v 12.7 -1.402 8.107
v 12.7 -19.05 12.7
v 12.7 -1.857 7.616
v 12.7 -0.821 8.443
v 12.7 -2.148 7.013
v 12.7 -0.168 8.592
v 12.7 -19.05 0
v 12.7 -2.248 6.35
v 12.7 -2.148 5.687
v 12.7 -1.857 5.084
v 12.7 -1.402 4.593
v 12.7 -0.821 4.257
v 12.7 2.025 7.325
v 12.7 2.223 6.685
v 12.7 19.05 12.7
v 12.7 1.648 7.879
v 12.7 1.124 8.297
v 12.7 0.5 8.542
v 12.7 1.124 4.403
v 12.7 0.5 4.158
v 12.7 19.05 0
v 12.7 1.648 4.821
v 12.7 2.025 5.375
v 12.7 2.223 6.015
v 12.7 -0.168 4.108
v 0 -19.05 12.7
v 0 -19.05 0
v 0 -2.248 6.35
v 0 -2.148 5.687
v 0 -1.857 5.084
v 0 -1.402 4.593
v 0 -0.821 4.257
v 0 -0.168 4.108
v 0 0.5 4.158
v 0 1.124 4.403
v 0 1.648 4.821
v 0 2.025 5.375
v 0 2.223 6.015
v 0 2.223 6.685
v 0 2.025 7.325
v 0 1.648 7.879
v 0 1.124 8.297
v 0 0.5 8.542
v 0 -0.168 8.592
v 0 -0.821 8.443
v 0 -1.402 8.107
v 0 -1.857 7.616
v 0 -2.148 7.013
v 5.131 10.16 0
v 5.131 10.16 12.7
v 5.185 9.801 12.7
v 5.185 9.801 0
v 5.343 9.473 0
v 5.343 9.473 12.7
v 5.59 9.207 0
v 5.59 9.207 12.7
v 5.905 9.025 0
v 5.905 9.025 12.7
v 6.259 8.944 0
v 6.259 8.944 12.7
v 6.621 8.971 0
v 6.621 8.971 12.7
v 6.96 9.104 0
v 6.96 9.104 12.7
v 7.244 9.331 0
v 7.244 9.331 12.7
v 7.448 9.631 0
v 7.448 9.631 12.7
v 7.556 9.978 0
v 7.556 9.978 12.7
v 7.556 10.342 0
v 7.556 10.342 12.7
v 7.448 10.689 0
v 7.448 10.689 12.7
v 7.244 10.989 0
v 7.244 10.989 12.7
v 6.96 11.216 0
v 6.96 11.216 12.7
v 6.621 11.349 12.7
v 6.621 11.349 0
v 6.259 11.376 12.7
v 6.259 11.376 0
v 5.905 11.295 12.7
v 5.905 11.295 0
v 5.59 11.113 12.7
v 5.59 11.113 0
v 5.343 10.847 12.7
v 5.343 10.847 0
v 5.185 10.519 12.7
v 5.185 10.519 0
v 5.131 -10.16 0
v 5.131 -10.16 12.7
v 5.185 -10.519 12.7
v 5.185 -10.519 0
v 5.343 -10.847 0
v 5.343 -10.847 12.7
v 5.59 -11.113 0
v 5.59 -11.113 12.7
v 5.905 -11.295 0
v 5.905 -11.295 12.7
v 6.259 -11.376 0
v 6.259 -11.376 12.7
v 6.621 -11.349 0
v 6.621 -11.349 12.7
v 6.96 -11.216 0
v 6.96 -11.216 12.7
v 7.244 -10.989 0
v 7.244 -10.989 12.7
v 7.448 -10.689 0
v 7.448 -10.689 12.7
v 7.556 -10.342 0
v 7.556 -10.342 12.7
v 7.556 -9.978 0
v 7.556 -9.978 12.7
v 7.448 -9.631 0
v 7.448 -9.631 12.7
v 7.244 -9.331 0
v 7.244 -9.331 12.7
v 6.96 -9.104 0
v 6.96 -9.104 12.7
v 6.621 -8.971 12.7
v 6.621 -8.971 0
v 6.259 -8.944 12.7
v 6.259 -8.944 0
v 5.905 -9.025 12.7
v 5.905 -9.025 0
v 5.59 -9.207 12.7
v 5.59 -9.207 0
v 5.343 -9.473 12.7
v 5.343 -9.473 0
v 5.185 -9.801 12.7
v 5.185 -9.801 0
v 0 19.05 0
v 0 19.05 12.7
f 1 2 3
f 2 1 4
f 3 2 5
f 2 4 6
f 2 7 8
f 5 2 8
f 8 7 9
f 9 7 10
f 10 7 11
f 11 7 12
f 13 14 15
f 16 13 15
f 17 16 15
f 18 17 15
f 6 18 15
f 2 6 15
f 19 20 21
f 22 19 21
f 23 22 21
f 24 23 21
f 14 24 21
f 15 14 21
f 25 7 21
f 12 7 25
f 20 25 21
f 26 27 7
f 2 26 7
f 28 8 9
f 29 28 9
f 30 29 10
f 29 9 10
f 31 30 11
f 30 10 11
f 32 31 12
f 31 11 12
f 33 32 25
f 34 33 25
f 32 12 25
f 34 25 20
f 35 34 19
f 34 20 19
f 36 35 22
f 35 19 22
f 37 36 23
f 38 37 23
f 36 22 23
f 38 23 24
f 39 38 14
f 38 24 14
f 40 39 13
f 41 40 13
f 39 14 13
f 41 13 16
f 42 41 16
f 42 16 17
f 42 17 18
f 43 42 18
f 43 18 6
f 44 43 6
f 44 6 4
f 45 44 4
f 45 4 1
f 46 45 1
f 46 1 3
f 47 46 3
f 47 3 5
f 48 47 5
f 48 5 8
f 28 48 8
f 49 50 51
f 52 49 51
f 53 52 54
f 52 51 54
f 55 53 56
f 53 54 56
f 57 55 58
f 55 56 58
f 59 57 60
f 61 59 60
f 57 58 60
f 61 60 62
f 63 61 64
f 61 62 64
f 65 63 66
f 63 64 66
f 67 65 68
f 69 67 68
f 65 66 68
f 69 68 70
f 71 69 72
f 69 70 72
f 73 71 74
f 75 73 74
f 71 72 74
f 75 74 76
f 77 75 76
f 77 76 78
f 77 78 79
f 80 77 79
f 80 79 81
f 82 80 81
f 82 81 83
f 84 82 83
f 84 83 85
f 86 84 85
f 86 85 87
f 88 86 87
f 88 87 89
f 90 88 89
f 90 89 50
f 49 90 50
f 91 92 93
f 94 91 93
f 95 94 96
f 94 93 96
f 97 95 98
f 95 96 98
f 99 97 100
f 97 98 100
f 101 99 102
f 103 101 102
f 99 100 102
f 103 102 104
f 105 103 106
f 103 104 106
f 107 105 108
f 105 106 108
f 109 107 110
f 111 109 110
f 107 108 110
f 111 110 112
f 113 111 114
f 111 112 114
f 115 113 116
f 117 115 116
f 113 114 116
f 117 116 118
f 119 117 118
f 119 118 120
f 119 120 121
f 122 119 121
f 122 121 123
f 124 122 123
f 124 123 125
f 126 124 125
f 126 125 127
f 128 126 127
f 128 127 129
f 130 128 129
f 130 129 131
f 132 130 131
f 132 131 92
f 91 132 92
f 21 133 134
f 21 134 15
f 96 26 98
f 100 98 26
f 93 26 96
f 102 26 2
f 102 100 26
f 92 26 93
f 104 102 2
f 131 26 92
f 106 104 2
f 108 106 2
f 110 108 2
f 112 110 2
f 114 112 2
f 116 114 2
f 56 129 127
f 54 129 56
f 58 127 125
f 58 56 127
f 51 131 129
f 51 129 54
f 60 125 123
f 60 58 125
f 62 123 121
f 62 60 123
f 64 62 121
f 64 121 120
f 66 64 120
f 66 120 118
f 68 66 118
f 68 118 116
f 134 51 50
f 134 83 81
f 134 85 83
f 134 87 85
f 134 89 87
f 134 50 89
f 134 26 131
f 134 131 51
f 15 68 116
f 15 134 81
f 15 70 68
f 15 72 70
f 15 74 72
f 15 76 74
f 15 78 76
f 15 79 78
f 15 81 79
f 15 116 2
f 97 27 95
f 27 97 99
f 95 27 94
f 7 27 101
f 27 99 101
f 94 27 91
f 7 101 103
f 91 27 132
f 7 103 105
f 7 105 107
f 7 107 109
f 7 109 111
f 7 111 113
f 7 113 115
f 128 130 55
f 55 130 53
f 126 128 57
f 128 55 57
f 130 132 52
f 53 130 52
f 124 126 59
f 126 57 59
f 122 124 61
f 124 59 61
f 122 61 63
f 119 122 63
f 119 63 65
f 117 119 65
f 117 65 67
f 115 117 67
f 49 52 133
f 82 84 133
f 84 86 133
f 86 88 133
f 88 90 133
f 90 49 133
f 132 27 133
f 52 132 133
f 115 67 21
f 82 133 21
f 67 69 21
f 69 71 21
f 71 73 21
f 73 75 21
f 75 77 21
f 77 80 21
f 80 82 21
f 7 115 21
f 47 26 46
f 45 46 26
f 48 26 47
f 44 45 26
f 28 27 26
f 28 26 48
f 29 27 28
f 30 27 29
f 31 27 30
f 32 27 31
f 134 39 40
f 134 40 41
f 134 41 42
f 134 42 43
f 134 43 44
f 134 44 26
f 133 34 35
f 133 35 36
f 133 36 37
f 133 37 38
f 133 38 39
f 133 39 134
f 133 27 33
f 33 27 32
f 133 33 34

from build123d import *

# Parameters (mm, degrees)
F0_W     = 12.7
F0_H     = 38.1
F1_DEPTH = 12.7
F3_D     = 4.4958
F5_D     = 2.4384


with BuildPart() as f1:
    # F0 (on Top) → F1 (new body)
    with BuildSketch(Plane.XY):
        with Locations((6.35, 0)):
            Rectangle(F0_W, F0_H)
    extrude(amount=F1_DEPTH)

    # F3 (through all)
    with Locations(Plane(origin=(0, 0, 0), x_dir=(0, 1, 0), z_dir=(-1, 0, 0))):
        with Locations((0, -6.35)):
            Hole(F3_D / 2)

    # F5 (through all)
    with Locations(Plane(origin=(0, 0, 0), x_dir=(1, 0, 0), z_dir=(0, 0, -1))):
        with Locations((6.35, -10.16), (6.35, 10.16)):
            Hole(F5_D / 2)


solid = f1.part
